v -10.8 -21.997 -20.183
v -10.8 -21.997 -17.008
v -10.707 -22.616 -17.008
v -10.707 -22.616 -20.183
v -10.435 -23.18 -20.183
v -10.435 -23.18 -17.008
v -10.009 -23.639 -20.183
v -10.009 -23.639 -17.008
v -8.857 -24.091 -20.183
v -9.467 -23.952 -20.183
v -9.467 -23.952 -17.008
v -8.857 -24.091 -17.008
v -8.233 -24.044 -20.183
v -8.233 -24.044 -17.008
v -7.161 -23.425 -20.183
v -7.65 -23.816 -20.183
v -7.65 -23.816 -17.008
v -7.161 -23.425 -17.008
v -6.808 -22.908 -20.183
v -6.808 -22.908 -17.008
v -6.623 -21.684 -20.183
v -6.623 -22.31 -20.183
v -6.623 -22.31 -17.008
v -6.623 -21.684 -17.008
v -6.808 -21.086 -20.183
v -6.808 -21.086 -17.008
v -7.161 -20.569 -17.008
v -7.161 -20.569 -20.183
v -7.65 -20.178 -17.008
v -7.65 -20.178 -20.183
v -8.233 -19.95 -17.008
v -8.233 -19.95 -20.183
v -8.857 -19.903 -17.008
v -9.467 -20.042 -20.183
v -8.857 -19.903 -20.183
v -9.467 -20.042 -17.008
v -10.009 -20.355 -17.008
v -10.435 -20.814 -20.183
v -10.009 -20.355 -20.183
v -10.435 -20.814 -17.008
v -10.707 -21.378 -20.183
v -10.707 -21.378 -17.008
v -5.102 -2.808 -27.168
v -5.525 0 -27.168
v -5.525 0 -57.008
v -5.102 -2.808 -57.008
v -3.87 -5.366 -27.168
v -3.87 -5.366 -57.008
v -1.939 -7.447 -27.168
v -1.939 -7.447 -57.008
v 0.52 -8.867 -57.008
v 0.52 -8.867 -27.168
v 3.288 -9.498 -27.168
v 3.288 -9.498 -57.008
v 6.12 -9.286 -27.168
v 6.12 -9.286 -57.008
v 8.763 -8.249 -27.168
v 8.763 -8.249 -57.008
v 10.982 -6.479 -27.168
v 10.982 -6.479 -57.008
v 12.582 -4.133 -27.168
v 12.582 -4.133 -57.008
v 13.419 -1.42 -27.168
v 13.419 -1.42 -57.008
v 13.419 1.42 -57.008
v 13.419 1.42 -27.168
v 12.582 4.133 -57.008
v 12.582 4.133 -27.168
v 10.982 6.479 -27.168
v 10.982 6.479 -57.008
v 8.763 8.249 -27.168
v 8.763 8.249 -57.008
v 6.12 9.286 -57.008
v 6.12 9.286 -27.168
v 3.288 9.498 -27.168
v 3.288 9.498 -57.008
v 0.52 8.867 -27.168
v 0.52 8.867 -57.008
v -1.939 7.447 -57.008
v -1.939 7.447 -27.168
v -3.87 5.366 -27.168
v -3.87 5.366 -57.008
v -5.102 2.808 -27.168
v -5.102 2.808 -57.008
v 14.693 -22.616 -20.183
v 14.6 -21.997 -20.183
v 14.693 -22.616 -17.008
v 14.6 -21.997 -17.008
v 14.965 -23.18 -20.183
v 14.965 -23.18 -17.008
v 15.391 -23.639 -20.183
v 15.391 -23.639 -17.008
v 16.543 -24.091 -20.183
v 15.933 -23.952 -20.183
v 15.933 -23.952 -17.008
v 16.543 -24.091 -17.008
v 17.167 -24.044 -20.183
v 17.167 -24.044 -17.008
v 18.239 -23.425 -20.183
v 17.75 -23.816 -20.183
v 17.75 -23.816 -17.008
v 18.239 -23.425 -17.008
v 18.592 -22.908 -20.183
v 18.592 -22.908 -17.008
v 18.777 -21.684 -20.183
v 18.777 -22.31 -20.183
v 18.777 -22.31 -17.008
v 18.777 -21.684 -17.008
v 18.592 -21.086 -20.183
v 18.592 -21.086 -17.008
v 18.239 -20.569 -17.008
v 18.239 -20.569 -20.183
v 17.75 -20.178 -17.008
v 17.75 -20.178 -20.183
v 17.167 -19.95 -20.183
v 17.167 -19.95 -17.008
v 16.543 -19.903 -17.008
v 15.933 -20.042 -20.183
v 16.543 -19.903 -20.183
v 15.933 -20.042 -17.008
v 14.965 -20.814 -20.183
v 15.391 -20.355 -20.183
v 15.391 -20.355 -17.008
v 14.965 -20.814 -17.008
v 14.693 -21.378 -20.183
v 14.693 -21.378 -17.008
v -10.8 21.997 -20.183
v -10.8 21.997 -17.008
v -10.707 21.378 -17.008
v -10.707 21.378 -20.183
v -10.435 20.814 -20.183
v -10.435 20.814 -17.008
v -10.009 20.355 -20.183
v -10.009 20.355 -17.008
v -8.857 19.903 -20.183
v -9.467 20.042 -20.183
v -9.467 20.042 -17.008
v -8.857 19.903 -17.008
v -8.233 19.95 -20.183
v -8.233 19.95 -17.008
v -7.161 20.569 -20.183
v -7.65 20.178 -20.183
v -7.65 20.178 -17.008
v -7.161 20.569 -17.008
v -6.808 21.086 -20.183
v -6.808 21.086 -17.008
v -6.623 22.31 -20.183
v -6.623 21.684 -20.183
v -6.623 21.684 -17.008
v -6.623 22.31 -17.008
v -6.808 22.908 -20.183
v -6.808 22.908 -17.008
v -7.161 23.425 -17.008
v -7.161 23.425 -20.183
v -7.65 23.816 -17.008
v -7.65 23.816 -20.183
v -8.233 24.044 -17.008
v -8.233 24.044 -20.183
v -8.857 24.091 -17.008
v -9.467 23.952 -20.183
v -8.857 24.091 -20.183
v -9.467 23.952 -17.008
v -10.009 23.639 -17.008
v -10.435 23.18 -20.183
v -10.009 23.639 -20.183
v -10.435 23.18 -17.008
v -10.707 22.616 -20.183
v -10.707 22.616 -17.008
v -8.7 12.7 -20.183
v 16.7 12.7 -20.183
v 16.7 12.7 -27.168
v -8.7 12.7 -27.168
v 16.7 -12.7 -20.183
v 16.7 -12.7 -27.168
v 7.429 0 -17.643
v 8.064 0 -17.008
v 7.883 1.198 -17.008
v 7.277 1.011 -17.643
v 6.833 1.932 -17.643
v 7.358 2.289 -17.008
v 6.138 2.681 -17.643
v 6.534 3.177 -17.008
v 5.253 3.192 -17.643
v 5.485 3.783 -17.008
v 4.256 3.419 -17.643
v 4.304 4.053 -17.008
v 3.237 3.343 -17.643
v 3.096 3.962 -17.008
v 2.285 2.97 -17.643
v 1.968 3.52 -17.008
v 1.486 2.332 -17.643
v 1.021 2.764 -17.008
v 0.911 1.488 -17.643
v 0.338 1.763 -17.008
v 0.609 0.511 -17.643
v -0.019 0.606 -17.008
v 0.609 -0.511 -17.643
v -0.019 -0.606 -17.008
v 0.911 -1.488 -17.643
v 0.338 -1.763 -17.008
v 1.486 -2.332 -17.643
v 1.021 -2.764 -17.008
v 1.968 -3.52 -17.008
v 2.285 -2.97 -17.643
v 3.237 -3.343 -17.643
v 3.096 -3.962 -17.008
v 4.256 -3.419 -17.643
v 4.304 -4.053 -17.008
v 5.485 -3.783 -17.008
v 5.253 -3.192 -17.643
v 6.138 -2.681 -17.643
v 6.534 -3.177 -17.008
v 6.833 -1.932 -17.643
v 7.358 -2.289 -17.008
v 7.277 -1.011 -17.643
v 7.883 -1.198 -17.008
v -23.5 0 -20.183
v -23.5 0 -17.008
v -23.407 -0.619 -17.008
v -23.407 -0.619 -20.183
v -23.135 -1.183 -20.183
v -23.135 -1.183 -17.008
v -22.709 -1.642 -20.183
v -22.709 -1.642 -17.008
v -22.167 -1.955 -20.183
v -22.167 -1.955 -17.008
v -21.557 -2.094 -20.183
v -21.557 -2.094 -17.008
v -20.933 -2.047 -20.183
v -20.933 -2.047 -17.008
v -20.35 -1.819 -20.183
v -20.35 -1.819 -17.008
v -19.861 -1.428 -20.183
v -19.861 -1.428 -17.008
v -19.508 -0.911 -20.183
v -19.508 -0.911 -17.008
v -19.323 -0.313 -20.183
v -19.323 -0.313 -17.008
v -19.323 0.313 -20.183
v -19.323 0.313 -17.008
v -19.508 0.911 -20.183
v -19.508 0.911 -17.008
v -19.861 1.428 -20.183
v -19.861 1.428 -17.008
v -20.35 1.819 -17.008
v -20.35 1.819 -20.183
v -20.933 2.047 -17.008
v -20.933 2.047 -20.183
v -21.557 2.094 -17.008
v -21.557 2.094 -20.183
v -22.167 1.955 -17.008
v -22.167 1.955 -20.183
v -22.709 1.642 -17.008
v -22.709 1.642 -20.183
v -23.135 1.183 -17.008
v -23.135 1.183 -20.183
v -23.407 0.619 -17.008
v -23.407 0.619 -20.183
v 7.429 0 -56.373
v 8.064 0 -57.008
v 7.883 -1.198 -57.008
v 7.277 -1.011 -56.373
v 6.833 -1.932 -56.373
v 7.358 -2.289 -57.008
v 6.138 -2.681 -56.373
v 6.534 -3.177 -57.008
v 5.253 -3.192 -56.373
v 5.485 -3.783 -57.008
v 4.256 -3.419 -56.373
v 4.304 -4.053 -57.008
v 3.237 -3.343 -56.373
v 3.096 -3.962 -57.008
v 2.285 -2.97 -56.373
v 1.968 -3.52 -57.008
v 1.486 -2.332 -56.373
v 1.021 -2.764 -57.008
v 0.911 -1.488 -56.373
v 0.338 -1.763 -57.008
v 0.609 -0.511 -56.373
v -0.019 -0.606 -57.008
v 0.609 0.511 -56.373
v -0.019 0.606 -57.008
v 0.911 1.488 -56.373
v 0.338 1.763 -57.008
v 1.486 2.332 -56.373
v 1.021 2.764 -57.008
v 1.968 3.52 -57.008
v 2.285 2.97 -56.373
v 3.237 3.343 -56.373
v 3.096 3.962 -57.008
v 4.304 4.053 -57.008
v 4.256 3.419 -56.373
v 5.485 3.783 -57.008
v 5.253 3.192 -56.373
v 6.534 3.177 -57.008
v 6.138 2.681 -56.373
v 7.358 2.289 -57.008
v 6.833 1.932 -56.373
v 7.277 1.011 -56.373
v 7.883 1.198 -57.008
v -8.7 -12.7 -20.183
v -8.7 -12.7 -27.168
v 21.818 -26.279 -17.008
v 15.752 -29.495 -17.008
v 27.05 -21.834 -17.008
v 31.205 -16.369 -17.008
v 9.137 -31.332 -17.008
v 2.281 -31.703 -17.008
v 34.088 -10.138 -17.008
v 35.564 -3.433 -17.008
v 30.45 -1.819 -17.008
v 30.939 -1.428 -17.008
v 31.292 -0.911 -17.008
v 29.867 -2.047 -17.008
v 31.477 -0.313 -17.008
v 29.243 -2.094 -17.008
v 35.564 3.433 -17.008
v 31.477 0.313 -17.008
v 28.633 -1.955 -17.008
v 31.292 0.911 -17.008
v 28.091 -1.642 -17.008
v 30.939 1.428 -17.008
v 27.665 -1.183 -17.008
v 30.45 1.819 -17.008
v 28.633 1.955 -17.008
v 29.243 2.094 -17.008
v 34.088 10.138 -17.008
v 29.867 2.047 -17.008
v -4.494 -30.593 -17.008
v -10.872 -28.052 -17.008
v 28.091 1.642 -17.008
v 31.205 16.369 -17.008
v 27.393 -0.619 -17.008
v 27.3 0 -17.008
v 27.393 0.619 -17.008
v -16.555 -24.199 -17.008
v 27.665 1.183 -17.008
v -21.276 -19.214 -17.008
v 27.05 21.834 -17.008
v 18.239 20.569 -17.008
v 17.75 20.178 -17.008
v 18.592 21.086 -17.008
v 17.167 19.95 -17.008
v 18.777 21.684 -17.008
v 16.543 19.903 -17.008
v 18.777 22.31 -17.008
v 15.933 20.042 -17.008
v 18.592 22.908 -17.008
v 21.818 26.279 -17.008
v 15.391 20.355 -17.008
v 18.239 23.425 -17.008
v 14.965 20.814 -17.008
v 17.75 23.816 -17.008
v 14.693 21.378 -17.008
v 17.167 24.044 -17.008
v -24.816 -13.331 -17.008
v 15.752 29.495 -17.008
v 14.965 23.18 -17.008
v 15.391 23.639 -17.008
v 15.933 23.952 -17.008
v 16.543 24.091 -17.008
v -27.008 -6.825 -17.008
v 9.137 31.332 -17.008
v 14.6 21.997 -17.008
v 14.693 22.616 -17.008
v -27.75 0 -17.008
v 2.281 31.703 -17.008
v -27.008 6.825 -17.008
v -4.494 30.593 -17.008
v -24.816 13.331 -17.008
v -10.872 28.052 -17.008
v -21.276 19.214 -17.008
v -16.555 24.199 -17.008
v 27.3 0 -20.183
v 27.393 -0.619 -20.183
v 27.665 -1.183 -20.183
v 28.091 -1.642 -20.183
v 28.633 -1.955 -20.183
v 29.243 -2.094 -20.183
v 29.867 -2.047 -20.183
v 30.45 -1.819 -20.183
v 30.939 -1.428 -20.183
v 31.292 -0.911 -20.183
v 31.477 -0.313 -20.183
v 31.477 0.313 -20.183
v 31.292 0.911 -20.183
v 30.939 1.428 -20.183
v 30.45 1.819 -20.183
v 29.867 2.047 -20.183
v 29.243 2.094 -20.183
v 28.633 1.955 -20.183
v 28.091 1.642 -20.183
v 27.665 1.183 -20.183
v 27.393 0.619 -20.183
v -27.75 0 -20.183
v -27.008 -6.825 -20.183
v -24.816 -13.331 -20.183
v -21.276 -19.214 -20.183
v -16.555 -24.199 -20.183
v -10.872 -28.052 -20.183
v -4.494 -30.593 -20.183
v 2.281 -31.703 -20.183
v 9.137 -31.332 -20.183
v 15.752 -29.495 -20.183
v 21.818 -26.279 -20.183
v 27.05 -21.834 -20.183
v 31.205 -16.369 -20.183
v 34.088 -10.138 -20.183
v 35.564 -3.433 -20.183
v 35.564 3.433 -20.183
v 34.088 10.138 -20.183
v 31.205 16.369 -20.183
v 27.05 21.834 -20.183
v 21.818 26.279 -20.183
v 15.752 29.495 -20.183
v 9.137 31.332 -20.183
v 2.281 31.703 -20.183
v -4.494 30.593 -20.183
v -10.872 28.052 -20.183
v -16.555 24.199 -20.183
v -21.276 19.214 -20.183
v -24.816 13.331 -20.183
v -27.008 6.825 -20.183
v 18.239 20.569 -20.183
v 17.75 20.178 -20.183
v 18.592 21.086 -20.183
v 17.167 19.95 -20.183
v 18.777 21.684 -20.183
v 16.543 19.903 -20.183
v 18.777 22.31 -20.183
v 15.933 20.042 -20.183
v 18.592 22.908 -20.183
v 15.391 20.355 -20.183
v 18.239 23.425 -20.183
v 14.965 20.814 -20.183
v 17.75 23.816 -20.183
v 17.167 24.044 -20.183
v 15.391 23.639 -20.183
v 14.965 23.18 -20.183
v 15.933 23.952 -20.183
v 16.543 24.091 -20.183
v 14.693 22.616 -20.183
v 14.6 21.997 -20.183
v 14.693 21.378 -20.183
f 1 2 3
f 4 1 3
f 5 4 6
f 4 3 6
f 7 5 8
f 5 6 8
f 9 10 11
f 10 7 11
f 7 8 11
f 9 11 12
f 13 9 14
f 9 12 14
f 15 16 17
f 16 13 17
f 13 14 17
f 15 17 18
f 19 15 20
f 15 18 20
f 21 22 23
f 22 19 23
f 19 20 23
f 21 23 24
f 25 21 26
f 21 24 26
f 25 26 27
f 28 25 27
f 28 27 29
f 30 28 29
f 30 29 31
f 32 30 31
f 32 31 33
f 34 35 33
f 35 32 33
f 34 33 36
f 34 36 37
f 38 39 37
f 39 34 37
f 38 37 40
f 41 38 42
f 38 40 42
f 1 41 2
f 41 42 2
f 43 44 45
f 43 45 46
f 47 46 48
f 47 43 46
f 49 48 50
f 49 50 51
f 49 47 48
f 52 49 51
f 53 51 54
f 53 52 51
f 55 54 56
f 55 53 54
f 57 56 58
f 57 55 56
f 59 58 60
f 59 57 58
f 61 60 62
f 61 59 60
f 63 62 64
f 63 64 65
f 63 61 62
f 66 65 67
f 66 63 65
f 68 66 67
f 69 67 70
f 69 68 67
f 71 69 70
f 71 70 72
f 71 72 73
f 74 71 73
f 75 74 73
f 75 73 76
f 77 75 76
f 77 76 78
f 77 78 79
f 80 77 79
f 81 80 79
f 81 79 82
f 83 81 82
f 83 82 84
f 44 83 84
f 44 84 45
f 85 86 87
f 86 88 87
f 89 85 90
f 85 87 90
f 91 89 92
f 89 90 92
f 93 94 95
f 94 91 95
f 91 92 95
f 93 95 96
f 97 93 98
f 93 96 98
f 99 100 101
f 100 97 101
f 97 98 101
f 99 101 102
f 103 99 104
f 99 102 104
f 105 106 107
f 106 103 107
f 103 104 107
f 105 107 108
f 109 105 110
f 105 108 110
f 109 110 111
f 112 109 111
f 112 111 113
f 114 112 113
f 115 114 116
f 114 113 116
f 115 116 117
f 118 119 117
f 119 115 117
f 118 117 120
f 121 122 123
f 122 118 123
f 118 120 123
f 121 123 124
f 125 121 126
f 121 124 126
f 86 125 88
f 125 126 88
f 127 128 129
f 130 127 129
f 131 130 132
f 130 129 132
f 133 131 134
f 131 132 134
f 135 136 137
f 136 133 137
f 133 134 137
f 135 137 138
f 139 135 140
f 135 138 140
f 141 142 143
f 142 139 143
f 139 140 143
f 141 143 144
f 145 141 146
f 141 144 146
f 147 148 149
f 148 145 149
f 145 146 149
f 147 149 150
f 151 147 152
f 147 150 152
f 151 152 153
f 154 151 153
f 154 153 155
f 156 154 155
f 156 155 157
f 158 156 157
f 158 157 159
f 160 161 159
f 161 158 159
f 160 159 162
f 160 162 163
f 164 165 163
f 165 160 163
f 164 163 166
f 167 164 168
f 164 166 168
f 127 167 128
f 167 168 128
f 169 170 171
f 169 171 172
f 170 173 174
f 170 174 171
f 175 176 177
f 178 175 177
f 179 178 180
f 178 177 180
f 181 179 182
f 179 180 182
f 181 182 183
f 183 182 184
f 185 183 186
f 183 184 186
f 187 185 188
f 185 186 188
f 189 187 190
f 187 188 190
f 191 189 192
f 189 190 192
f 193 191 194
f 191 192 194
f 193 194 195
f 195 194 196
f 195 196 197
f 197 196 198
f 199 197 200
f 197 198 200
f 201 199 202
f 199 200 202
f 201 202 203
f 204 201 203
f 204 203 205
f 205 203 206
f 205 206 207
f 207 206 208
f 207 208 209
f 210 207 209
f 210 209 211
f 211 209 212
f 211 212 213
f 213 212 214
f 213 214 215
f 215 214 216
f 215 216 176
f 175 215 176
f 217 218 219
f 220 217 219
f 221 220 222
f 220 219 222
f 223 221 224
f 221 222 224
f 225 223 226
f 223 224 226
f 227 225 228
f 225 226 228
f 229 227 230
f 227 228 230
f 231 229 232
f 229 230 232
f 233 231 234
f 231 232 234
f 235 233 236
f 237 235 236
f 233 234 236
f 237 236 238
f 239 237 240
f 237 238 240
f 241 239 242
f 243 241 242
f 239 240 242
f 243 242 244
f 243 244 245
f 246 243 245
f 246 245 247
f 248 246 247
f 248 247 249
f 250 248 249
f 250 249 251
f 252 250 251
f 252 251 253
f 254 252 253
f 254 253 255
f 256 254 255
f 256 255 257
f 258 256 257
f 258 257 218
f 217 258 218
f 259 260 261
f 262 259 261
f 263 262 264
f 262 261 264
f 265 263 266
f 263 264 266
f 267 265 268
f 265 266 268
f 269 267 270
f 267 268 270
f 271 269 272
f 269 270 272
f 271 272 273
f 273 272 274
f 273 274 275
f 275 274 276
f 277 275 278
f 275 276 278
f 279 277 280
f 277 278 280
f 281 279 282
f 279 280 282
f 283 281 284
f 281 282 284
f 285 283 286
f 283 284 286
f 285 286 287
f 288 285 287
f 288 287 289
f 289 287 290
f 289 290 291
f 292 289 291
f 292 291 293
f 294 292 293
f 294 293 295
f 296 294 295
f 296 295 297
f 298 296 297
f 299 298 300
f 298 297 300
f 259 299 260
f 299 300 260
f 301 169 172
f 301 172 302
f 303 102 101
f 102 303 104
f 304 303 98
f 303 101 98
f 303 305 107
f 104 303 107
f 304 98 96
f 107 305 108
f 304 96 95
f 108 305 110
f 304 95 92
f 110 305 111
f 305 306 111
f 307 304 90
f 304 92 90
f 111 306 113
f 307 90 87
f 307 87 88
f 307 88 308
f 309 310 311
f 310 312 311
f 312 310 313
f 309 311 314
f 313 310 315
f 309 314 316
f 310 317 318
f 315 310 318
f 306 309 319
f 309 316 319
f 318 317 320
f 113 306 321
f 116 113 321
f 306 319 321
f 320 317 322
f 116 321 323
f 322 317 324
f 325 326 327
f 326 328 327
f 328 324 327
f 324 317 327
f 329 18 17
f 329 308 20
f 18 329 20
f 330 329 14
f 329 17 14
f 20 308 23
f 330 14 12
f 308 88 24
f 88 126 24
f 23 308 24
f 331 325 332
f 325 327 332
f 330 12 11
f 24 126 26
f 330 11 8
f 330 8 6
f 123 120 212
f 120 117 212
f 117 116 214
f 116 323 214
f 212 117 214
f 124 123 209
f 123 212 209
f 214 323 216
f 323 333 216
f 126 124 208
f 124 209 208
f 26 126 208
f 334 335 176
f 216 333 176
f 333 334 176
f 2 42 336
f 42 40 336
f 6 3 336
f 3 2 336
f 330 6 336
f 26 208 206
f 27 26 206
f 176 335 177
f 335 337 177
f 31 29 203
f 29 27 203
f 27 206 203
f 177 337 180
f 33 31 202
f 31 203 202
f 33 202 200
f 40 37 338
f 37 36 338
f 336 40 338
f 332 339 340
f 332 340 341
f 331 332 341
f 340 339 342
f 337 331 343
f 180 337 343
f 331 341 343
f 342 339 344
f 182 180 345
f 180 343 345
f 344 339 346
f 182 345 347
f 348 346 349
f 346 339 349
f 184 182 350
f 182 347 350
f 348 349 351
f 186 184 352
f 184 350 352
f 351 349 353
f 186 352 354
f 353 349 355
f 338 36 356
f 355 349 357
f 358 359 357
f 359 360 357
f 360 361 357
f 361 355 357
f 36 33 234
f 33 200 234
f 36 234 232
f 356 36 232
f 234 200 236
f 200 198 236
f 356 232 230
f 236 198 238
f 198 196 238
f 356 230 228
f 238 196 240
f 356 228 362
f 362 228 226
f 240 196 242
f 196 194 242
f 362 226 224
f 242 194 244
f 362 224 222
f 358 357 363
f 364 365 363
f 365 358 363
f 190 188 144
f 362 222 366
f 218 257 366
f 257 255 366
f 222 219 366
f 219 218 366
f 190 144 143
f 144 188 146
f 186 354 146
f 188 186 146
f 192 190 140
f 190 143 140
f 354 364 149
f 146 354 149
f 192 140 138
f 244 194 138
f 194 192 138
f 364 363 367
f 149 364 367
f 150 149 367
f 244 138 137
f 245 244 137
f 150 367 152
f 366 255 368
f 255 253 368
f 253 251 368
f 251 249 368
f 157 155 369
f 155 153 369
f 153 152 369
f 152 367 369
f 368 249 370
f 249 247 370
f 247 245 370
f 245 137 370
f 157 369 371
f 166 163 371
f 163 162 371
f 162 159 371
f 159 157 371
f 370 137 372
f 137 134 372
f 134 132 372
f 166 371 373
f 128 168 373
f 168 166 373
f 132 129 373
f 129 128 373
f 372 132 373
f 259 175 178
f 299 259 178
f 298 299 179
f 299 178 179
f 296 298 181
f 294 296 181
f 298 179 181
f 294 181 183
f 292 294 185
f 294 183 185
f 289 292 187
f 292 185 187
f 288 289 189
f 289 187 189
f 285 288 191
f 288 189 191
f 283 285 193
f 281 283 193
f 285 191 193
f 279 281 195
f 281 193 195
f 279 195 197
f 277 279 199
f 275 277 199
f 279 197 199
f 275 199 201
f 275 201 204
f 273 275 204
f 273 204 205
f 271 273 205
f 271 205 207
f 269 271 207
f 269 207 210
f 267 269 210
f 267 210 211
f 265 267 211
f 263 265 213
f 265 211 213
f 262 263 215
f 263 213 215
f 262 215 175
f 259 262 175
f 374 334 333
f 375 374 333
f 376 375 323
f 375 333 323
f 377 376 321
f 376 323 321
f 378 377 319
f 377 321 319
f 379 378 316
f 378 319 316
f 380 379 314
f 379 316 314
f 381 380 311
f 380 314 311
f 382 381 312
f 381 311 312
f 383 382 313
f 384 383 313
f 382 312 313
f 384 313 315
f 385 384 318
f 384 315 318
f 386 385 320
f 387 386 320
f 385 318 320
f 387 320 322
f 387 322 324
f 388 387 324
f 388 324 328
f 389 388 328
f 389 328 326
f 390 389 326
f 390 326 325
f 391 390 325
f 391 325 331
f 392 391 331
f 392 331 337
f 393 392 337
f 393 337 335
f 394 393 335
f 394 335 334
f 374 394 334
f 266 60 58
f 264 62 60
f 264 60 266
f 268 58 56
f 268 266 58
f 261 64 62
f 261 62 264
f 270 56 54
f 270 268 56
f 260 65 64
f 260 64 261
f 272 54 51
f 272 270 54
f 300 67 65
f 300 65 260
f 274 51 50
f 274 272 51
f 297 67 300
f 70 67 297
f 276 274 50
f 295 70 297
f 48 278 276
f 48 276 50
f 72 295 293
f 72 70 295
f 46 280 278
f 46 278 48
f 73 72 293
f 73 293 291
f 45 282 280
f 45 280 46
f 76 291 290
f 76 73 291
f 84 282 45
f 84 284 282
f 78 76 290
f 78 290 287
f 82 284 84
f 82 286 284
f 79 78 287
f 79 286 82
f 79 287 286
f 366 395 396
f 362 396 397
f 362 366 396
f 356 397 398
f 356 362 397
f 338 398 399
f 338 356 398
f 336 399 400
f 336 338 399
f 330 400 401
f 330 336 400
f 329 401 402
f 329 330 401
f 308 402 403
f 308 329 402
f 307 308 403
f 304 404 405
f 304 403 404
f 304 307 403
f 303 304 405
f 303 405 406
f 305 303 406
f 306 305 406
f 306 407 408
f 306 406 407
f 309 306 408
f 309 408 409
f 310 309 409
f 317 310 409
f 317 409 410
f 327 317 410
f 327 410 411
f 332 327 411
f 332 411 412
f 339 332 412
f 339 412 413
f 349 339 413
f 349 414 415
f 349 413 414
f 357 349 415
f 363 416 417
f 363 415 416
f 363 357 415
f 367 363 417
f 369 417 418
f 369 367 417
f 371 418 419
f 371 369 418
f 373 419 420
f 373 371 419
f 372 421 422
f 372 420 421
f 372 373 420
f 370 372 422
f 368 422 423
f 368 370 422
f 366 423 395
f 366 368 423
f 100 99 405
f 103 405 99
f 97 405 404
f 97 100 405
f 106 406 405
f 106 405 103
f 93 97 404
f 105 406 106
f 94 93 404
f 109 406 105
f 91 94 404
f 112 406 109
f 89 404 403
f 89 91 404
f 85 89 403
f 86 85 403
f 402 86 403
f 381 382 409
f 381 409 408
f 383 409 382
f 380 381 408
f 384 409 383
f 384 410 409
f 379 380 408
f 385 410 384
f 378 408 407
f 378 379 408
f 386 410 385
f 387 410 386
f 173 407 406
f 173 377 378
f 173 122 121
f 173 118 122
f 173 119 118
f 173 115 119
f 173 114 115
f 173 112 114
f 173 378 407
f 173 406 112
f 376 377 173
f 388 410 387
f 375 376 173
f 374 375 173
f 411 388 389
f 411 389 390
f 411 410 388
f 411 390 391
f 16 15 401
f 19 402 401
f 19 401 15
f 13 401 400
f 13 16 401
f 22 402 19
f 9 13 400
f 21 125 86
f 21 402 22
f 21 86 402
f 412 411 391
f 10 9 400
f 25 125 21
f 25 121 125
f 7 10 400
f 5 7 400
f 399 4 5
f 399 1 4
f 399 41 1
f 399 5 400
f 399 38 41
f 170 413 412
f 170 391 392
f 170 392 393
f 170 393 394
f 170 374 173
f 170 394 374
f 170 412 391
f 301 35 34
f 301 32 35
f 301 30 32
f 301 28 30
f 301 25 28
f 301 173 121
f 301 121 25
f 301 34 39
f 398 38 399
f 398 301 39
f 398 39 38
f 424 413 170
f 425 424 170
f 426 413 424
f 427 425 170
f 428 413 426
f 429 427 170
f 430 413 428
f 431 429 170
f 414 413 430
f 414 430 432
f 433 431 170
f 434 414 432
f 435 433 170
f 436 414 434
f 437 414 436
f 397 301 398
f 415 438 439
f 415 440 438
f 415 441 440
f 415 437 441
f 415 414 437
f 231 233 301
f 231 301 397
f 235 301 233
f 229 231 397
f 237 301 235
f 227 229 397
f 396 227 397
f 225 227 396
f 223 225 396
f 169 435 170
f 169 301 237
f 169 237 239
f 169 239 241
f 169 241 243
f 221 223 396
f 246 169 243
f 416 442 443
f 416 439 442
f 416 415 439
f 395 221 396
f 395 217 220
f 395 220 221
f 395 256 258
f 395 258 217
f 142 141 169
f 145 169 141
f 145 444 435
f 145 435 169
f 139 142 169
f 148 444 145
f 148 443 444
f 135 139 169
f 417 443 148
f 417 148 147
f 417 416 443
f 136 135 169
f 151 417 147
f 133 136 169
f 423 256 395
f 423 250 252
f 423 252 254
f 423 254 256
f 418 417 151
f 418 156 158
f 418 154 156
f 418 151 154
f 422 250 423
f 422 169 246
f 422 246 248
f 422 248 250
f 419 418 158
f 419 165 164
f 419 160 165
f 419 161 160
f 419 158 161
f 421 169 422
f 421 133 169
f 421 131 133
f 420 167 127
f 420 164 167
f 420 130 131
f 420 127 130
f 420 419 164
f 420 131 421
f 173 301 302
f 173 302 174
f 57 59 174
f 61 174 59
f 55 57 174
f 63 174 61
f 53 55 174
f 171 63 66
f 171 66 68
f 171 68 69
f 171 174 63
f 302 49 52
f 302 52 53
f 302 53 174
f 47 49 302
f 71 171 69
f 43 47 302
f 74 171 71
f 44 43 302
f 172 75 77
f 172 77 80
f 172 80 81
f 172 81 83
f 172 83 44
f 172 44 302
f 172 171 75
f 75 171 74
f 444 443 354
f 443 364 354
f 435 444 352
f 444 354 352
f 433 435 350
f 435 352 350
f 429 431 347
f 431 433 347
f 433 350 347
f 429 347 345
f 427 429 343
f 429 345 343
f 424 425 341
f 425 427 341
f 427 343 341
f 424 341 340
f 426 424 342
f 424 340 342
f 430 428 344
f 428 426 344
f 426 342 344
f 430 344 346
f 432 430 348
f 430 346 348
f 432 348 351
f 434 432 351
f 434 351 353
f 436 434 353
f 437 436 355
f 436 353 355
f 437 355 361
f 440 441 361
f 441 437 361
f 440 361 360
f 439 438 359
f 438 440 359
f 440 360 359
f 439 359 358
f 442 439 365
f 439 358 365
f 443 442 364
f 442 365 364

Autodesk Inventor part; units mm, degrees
ref_plane "YZ Plane" through (0, 0, 0) normal (1, 0, 0) x (0, 1, 0)
ref_plane "XZ Plane" through (0, 0, 0) normal (0, 1, 0) x (-1, 0, 0)
ref_plane "XY Plane" through (0, 0, 0) normal (0, 0, 1) x (1, 0, 0)
sketch "Sketch1" plane through (0, 0, 0) normal (0, 0, 1) x (1, 0, 0)
  circle A0 centre (4, 0) radius 4 projected
  circle A1 centre (4, 0) radius 3.175 projected
  circle A2 centre (4, 0) radius 3.9492
  circle A3 centre (4, 0) radius 3.2512
  point P0 (0, 0)
  dimension "d0" = 0.0508
  dimension "d1" = 0.0762
extrude "Extrusion1" add sketch "Sketch1" along normal blind 15 and the other way blind 57.0076 contours A2
ref_plane "Work Plane1" through (-7, 0, -17.0076) normal (0, 0, -1) x (-1, 0, 0)
sketch "Sketch2" plane through (-7, 0, -17.0076) normal (0, 0, -1) x (-1, 0, 0)
  circle A0 centre (-11, 0) radius 3.9492 projected
  line L0 (-11, 0) -> (126.5, 0)
  line L1 (-11, 0) -> (-561, 0)
  circle A1 centre (-561, 0) radius 12.7
  circle A2 centre (-11, 0) radius 31.75
  line L2 (35.9, 0) -> (-573.7, 0)
  circle A3 centre (-36.4, 0) radius 2.1
  circle A4 centre (-23.7, -21.997) radius 2.1
  circle A5 centre (1.7, -21.997) radius 2.1
  circle A6 centre (14.4, 0) radius 2.1
  circle A7 centre (1.7, 21.997) radius 2.1
  circle A8 centre (-23.7, 21.997) radius 2.1
  line L3 (1.7, -12.7) -> (-23.7, -12.7)
  line L4 (-23.7, -12.7) -> (-23.7, 12.7)
  line L5 (-23.7, 12.7) -> (1.7, 12.7)
  line L6 (1.7, 12.7) -> (1.7, -12.7)
  line L7 (1.7, -12.7) -> (-23.7, 12.7) construction
  line L8 (-23.7, -12.7) -> (1.7, 12.7) construction
  circle A9 centre (-11, 0) radius 9.525
  point P0 (-7, 0)
  dimension "d8" = 25.4
  dimension "d6" = 137.5
  dimension "d7" = 550
  dimension "d9" = 63.5
  dimension "d10" = 609.6
  dimension "d11" = 4.2
  dimension "d12" = 25.4
  dimension "d15" = 360
  dimension "d17" = 25.4
  dimension "d18" = 25.4
  dimension "d19" = 19.05
extrude "Extrusion2" add sketch "Sketch2" along normal blind 40 contours L0 L1 A0 | L0 A9 L1 A0 | A0 L1 L0 | A0 L1 A9 L0
extrude "Extrusion3" add sketch "Sketch2" along normal blind 10.16 contours L0 L1 A0 | L0 A9 L1 A0 | A0 L1 L0 | A0 L1 A9 L0 | A9 L1 L4 L5 L6 L0 | L0 L6 L3 L4 L1 A9
extrude "Extrusion4" add sketch "Sketch2" along normal blind 3.175 contours L6 L5 L4 L1 A3 A2 L0 A6 | L0 A6 A2 L1 A3 L4 L3 L6
sketch "Sketch3" plane through (4, 0, 15) normal (0, 0, 1) x (1, 0, 0)
  line L0 (8.0047, -6.9197) -> (-11.6012, -6.9197)
  line L1 (-11.6012, -6.9197) -> (-11.6012, 5.9412)
  line L2 (-11.6012, 5.9412) -> (8.0047, 5.9412)
  line L3 (8.0047, 5.9412) -> (8.0047, -6.9197)
  point P0 (-4, 0)
extrude "Extrusion5" cut sketch "Sketch3" against normal blind 32.0076
sketch "Sketch4" plane through (4, 0, -17.0076) normal (0, 0, 1) x (1, 0, 0)
  circle A0 centre (0, 0) radius 3.175 projected
  circle A1 centre (0, 0) radius 3.429
  point P0 (-4, 0)
  dimension "d31" = 0.254
extrude "Extrusion6" cut sketch "Sketch4" against normal blind 40 contours A0 | A1
chamfer "Chamfer2" distance 0.635 angle 45 2 edges at (0.571, 0, -17.0076) (0.571, 0, -57.0076)
properties part number "ArmPivot"
